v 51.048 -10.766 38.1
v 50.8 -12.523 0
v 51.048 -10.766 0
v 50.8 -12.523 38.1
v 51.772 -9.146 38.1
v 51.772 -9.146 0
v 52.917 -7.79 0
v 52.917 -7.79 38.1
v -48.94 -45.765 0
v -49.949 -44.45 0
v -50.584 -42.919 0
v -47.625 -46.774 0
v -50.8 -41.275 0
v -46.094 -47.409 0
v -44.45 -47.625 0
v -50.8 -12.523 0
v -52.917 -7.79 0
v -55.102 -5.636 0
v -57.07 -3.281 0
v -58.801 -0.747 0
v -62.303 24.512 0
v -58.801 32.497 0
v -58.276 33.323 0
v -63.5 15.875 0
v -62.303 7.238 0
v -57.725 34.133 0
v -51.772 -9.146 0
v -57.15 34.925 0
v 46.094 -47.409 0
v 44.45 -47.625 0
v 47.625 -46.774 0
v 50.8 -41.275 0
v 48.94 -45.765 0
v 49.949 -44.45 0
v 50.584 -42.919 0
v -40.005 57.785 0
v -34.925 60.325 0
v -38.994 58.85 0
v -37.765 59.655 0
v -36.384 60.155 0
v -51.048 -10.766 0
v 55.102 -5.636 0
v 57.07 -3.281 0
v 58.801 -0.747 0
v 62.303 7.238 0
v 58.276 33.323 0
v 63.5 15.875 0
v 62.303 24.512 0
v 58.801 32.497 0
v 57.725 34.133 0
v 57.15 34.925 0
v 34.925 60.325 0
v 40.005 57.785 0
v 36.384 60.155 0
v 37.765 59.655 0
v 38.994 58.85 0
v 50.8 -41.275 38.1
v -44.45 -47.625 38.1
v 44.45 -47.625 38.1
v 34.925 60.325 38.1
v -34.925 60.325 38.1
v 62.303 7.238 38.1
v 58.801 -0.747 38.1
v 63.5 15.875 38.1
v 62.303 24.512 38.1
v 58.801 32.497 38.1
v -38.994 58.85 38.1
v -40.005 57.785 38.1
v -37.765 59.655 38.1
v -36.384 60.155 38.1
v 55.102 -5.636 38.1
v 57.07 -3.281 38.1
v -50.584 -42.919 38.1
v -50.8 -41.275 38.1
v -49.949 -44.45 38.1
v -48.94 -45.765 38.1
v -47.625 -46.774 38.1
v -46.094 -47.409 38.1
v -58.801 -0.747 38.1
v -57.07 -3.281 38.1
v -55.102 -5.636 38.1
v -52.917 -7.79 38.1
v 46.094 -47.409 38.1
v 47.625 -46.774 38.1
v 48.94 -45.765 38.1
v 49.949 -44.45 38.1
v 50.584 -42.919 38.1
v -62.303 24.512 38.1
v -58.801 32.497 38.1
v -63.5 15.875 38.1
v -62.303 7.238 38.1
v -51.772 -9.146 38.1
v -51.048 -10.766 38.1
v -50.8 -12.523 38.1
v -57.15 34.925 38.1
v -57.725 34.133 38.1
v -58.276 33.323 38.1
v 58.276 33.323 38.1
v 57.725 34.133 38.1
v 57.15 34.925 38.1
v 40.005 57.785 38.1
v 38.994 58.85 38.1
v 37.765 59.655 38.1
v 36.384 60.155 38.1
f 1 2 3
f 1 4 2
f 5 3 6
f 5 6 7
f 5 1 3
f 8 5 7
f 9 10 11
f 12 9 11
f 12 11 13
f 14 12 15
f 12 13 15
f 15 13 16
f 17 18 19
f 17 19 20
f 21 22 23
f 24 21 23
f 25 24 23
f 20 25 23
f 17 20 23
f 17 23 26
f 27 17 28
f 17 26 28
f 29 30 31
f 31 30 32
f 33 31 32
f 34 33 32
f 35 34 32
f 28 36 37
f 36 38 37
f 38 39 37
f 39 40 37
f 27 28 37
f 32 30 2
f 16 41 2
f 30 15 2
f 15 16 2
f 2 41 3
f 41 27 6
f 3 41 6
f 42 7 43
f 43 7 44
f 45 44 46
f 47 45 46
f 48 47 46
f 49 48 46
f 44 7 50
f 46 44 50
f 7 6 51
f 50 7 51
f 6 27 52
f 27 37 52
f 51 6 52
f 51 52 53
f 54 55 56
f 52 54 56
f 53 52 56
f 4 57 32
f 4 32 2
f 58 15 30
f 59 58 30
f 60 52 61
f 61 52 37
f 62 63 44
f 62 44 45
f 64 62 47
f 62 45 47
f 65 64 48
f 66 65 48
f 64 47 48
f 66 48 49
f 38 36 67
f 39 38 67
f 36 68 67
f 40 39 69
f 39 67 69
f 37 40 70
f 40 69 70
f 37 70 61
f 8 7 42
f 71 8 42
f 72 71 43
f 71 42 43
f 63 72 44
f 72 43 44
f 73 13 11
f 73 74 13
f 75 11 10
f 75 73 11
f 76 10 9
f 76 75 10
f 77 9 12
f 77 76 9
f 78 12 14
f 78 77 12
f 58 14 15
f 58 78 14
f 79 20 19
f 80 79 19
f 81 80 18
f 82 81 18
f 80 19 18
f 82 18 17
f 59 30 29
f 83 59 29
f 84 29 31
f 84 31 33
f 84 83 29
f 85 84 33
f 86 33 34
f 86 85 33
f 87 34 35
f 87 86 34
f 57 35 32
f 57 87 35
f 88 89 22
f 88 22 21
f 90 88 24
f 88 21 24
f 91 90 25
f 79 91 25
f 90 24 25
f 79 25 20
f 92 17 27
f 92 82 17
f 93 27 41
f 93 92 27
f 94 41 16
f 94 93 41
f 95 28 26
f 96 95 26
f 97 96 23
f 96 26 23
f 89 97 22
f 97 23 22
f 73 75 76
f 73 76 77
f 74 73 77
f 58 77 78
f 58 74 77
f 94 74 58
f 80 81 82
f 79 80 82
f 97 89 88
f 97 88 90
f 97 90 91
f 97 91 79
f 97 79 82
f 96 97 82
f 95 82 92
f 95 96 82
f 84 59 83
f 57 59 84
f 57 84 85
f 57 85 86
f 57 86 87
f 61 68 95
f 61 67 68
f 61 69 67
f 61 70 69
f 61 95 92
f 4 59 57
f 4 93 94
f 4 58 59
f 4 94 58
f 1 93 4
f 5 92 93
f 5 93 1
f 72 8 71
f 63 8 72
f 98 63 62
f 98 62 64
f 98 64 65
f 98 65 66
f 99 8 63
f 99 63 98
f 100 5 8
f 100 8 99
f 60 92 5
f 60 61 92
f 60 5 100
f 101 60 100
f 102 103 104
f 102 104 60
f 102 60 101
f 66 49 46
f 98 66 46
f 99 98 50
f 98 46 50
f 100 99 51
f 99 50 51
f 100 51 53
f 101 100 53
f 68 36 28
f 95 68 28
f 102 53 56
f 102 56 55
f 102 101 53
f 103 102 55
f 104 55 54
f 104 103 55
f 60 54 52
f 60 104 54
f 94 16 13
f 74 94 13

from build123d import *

# Parameters (mm, degrees)
F1_DEPTH = 38.1
F2_R     = 6.35


with BuildPart() as f1:
    # F0 (on Top) → F1 (new body)
    with BuildSketch(Plane.XY):
        Polygon((-31.75, 47.625), (0, 47.625), (0, 60.325), (-38.1, 60.325), (-47.625, 47.625), align=None)
        Polygon((0, 47.625), (31.75, 47.625), (47.625, 47.625), (38.1, 60.325), (0, 60.325), align=None)
        with BuildLine():
            ThreePointArc((-57.15, 34.925), (-45.9490316571, 44.2730633142), (-31.75, 47.625))
            Line((-31.75, 47.625), (-47.625, 47.625))
            Line((-47.625, 47.625), (-57.15, 34.925))
        make_face()
        with BuildLine():
            Line((0, 34.925), (0, 47.625))
            Line((0, 47.625), (-31.75, 47.625))
            ThreePointArc((-31.75, 47.625), (-45.9490316571, 44.2730633142), (-57.15, 34.925))
            Line((-57.15, 34.925), (0, 34.925))
        make_face()
        with BuildLine():
            ThreePointArc((57.15, 34.925), (45.9490316571, 44.2730633142), (31.75, 47.625))
            Line((31.75, 47.625), (0, 47.625))
            Line((0, 47.625), (0, 34.925))
            Line((0, 34.925), (57.15, 34.925))
        make_face()
        with BuildLine():
            Line((47.625, 47.625), (31.75, 47.625))
            ThreePointArc((31.75, 47.625), (45.9490316571, 44.2730633142), (57.15, 34.925))
            Line((57.15, 34.925), (47.625, 47.625))
        make_face()
        with BuildLine():
            ThreePointArc((58.801, 32.4974516543), (58.0035730519, 33.7303185916), (57.15, 34.925))
            Line((57.15, 34.925), (0, 34.925))
            Line((0, 34.925), (-57.15, 34.925))
            ThreePointArc((-57.15, 34.925), (-58.0035730519, 33.7303185916), (-58.801, 32.4974516543))
            Line((-58.801, 32.4974516543), (-58.801, -0.7474516543))
            ThreePointArc((-58.801, -0.7474516543), (-55.2145879783, -5.513679506), (-50.8, -9.525))
            Line((-50.8, -9.525), (-50.8, -47.625))
            Line((-50.8, -47.625), (0, -47.625))
            Line((0, -47.625), (50.8, -47.625))
            Line((50.8, -47.625), (50.8, -9.525))
            ThreePointArc((50.8, -9.525), (55.2145879783, -5.513679506), (58.801, -0.7474516543))
            Line((58.801, -0.7474516543), (58.801, 32.4974516543))
        make_face()
        with BuildLine():
            ThreePointArc((58.801, -0.7474516543), (63.5, 15.875), (58.801, 32.4974516543))
            Line((58.801, 32.4974516543), (58.801, -0.7474516543))
        make_face()
        with BuildLine():
            Line((-58.801, -0.7474516543), (-58.801, 32.4974516543))
            ThreePointArc((-58.801, 32.4974516543), (-63.5, 15.875), (-58.801, -0.7474516543))
        make_face()
    extrude(amount=F1_DEPTH)

    # F2
    f2_edges = [f1.edges().sort_by_distance(p)[0] for p in [
        (-50.8, -47.625, 19.05),
        (50.8, -47.625, 19.05),
        (50.8, -9.525, 19.05),
        (-50.8, -9.525, 19.05),
        (-38.1, 60.325, 19.05),
        (38.1, 60.325, 19.05),
    ]]
    fillet(f2_edges, radius=F2_R)


solid = f1.part
